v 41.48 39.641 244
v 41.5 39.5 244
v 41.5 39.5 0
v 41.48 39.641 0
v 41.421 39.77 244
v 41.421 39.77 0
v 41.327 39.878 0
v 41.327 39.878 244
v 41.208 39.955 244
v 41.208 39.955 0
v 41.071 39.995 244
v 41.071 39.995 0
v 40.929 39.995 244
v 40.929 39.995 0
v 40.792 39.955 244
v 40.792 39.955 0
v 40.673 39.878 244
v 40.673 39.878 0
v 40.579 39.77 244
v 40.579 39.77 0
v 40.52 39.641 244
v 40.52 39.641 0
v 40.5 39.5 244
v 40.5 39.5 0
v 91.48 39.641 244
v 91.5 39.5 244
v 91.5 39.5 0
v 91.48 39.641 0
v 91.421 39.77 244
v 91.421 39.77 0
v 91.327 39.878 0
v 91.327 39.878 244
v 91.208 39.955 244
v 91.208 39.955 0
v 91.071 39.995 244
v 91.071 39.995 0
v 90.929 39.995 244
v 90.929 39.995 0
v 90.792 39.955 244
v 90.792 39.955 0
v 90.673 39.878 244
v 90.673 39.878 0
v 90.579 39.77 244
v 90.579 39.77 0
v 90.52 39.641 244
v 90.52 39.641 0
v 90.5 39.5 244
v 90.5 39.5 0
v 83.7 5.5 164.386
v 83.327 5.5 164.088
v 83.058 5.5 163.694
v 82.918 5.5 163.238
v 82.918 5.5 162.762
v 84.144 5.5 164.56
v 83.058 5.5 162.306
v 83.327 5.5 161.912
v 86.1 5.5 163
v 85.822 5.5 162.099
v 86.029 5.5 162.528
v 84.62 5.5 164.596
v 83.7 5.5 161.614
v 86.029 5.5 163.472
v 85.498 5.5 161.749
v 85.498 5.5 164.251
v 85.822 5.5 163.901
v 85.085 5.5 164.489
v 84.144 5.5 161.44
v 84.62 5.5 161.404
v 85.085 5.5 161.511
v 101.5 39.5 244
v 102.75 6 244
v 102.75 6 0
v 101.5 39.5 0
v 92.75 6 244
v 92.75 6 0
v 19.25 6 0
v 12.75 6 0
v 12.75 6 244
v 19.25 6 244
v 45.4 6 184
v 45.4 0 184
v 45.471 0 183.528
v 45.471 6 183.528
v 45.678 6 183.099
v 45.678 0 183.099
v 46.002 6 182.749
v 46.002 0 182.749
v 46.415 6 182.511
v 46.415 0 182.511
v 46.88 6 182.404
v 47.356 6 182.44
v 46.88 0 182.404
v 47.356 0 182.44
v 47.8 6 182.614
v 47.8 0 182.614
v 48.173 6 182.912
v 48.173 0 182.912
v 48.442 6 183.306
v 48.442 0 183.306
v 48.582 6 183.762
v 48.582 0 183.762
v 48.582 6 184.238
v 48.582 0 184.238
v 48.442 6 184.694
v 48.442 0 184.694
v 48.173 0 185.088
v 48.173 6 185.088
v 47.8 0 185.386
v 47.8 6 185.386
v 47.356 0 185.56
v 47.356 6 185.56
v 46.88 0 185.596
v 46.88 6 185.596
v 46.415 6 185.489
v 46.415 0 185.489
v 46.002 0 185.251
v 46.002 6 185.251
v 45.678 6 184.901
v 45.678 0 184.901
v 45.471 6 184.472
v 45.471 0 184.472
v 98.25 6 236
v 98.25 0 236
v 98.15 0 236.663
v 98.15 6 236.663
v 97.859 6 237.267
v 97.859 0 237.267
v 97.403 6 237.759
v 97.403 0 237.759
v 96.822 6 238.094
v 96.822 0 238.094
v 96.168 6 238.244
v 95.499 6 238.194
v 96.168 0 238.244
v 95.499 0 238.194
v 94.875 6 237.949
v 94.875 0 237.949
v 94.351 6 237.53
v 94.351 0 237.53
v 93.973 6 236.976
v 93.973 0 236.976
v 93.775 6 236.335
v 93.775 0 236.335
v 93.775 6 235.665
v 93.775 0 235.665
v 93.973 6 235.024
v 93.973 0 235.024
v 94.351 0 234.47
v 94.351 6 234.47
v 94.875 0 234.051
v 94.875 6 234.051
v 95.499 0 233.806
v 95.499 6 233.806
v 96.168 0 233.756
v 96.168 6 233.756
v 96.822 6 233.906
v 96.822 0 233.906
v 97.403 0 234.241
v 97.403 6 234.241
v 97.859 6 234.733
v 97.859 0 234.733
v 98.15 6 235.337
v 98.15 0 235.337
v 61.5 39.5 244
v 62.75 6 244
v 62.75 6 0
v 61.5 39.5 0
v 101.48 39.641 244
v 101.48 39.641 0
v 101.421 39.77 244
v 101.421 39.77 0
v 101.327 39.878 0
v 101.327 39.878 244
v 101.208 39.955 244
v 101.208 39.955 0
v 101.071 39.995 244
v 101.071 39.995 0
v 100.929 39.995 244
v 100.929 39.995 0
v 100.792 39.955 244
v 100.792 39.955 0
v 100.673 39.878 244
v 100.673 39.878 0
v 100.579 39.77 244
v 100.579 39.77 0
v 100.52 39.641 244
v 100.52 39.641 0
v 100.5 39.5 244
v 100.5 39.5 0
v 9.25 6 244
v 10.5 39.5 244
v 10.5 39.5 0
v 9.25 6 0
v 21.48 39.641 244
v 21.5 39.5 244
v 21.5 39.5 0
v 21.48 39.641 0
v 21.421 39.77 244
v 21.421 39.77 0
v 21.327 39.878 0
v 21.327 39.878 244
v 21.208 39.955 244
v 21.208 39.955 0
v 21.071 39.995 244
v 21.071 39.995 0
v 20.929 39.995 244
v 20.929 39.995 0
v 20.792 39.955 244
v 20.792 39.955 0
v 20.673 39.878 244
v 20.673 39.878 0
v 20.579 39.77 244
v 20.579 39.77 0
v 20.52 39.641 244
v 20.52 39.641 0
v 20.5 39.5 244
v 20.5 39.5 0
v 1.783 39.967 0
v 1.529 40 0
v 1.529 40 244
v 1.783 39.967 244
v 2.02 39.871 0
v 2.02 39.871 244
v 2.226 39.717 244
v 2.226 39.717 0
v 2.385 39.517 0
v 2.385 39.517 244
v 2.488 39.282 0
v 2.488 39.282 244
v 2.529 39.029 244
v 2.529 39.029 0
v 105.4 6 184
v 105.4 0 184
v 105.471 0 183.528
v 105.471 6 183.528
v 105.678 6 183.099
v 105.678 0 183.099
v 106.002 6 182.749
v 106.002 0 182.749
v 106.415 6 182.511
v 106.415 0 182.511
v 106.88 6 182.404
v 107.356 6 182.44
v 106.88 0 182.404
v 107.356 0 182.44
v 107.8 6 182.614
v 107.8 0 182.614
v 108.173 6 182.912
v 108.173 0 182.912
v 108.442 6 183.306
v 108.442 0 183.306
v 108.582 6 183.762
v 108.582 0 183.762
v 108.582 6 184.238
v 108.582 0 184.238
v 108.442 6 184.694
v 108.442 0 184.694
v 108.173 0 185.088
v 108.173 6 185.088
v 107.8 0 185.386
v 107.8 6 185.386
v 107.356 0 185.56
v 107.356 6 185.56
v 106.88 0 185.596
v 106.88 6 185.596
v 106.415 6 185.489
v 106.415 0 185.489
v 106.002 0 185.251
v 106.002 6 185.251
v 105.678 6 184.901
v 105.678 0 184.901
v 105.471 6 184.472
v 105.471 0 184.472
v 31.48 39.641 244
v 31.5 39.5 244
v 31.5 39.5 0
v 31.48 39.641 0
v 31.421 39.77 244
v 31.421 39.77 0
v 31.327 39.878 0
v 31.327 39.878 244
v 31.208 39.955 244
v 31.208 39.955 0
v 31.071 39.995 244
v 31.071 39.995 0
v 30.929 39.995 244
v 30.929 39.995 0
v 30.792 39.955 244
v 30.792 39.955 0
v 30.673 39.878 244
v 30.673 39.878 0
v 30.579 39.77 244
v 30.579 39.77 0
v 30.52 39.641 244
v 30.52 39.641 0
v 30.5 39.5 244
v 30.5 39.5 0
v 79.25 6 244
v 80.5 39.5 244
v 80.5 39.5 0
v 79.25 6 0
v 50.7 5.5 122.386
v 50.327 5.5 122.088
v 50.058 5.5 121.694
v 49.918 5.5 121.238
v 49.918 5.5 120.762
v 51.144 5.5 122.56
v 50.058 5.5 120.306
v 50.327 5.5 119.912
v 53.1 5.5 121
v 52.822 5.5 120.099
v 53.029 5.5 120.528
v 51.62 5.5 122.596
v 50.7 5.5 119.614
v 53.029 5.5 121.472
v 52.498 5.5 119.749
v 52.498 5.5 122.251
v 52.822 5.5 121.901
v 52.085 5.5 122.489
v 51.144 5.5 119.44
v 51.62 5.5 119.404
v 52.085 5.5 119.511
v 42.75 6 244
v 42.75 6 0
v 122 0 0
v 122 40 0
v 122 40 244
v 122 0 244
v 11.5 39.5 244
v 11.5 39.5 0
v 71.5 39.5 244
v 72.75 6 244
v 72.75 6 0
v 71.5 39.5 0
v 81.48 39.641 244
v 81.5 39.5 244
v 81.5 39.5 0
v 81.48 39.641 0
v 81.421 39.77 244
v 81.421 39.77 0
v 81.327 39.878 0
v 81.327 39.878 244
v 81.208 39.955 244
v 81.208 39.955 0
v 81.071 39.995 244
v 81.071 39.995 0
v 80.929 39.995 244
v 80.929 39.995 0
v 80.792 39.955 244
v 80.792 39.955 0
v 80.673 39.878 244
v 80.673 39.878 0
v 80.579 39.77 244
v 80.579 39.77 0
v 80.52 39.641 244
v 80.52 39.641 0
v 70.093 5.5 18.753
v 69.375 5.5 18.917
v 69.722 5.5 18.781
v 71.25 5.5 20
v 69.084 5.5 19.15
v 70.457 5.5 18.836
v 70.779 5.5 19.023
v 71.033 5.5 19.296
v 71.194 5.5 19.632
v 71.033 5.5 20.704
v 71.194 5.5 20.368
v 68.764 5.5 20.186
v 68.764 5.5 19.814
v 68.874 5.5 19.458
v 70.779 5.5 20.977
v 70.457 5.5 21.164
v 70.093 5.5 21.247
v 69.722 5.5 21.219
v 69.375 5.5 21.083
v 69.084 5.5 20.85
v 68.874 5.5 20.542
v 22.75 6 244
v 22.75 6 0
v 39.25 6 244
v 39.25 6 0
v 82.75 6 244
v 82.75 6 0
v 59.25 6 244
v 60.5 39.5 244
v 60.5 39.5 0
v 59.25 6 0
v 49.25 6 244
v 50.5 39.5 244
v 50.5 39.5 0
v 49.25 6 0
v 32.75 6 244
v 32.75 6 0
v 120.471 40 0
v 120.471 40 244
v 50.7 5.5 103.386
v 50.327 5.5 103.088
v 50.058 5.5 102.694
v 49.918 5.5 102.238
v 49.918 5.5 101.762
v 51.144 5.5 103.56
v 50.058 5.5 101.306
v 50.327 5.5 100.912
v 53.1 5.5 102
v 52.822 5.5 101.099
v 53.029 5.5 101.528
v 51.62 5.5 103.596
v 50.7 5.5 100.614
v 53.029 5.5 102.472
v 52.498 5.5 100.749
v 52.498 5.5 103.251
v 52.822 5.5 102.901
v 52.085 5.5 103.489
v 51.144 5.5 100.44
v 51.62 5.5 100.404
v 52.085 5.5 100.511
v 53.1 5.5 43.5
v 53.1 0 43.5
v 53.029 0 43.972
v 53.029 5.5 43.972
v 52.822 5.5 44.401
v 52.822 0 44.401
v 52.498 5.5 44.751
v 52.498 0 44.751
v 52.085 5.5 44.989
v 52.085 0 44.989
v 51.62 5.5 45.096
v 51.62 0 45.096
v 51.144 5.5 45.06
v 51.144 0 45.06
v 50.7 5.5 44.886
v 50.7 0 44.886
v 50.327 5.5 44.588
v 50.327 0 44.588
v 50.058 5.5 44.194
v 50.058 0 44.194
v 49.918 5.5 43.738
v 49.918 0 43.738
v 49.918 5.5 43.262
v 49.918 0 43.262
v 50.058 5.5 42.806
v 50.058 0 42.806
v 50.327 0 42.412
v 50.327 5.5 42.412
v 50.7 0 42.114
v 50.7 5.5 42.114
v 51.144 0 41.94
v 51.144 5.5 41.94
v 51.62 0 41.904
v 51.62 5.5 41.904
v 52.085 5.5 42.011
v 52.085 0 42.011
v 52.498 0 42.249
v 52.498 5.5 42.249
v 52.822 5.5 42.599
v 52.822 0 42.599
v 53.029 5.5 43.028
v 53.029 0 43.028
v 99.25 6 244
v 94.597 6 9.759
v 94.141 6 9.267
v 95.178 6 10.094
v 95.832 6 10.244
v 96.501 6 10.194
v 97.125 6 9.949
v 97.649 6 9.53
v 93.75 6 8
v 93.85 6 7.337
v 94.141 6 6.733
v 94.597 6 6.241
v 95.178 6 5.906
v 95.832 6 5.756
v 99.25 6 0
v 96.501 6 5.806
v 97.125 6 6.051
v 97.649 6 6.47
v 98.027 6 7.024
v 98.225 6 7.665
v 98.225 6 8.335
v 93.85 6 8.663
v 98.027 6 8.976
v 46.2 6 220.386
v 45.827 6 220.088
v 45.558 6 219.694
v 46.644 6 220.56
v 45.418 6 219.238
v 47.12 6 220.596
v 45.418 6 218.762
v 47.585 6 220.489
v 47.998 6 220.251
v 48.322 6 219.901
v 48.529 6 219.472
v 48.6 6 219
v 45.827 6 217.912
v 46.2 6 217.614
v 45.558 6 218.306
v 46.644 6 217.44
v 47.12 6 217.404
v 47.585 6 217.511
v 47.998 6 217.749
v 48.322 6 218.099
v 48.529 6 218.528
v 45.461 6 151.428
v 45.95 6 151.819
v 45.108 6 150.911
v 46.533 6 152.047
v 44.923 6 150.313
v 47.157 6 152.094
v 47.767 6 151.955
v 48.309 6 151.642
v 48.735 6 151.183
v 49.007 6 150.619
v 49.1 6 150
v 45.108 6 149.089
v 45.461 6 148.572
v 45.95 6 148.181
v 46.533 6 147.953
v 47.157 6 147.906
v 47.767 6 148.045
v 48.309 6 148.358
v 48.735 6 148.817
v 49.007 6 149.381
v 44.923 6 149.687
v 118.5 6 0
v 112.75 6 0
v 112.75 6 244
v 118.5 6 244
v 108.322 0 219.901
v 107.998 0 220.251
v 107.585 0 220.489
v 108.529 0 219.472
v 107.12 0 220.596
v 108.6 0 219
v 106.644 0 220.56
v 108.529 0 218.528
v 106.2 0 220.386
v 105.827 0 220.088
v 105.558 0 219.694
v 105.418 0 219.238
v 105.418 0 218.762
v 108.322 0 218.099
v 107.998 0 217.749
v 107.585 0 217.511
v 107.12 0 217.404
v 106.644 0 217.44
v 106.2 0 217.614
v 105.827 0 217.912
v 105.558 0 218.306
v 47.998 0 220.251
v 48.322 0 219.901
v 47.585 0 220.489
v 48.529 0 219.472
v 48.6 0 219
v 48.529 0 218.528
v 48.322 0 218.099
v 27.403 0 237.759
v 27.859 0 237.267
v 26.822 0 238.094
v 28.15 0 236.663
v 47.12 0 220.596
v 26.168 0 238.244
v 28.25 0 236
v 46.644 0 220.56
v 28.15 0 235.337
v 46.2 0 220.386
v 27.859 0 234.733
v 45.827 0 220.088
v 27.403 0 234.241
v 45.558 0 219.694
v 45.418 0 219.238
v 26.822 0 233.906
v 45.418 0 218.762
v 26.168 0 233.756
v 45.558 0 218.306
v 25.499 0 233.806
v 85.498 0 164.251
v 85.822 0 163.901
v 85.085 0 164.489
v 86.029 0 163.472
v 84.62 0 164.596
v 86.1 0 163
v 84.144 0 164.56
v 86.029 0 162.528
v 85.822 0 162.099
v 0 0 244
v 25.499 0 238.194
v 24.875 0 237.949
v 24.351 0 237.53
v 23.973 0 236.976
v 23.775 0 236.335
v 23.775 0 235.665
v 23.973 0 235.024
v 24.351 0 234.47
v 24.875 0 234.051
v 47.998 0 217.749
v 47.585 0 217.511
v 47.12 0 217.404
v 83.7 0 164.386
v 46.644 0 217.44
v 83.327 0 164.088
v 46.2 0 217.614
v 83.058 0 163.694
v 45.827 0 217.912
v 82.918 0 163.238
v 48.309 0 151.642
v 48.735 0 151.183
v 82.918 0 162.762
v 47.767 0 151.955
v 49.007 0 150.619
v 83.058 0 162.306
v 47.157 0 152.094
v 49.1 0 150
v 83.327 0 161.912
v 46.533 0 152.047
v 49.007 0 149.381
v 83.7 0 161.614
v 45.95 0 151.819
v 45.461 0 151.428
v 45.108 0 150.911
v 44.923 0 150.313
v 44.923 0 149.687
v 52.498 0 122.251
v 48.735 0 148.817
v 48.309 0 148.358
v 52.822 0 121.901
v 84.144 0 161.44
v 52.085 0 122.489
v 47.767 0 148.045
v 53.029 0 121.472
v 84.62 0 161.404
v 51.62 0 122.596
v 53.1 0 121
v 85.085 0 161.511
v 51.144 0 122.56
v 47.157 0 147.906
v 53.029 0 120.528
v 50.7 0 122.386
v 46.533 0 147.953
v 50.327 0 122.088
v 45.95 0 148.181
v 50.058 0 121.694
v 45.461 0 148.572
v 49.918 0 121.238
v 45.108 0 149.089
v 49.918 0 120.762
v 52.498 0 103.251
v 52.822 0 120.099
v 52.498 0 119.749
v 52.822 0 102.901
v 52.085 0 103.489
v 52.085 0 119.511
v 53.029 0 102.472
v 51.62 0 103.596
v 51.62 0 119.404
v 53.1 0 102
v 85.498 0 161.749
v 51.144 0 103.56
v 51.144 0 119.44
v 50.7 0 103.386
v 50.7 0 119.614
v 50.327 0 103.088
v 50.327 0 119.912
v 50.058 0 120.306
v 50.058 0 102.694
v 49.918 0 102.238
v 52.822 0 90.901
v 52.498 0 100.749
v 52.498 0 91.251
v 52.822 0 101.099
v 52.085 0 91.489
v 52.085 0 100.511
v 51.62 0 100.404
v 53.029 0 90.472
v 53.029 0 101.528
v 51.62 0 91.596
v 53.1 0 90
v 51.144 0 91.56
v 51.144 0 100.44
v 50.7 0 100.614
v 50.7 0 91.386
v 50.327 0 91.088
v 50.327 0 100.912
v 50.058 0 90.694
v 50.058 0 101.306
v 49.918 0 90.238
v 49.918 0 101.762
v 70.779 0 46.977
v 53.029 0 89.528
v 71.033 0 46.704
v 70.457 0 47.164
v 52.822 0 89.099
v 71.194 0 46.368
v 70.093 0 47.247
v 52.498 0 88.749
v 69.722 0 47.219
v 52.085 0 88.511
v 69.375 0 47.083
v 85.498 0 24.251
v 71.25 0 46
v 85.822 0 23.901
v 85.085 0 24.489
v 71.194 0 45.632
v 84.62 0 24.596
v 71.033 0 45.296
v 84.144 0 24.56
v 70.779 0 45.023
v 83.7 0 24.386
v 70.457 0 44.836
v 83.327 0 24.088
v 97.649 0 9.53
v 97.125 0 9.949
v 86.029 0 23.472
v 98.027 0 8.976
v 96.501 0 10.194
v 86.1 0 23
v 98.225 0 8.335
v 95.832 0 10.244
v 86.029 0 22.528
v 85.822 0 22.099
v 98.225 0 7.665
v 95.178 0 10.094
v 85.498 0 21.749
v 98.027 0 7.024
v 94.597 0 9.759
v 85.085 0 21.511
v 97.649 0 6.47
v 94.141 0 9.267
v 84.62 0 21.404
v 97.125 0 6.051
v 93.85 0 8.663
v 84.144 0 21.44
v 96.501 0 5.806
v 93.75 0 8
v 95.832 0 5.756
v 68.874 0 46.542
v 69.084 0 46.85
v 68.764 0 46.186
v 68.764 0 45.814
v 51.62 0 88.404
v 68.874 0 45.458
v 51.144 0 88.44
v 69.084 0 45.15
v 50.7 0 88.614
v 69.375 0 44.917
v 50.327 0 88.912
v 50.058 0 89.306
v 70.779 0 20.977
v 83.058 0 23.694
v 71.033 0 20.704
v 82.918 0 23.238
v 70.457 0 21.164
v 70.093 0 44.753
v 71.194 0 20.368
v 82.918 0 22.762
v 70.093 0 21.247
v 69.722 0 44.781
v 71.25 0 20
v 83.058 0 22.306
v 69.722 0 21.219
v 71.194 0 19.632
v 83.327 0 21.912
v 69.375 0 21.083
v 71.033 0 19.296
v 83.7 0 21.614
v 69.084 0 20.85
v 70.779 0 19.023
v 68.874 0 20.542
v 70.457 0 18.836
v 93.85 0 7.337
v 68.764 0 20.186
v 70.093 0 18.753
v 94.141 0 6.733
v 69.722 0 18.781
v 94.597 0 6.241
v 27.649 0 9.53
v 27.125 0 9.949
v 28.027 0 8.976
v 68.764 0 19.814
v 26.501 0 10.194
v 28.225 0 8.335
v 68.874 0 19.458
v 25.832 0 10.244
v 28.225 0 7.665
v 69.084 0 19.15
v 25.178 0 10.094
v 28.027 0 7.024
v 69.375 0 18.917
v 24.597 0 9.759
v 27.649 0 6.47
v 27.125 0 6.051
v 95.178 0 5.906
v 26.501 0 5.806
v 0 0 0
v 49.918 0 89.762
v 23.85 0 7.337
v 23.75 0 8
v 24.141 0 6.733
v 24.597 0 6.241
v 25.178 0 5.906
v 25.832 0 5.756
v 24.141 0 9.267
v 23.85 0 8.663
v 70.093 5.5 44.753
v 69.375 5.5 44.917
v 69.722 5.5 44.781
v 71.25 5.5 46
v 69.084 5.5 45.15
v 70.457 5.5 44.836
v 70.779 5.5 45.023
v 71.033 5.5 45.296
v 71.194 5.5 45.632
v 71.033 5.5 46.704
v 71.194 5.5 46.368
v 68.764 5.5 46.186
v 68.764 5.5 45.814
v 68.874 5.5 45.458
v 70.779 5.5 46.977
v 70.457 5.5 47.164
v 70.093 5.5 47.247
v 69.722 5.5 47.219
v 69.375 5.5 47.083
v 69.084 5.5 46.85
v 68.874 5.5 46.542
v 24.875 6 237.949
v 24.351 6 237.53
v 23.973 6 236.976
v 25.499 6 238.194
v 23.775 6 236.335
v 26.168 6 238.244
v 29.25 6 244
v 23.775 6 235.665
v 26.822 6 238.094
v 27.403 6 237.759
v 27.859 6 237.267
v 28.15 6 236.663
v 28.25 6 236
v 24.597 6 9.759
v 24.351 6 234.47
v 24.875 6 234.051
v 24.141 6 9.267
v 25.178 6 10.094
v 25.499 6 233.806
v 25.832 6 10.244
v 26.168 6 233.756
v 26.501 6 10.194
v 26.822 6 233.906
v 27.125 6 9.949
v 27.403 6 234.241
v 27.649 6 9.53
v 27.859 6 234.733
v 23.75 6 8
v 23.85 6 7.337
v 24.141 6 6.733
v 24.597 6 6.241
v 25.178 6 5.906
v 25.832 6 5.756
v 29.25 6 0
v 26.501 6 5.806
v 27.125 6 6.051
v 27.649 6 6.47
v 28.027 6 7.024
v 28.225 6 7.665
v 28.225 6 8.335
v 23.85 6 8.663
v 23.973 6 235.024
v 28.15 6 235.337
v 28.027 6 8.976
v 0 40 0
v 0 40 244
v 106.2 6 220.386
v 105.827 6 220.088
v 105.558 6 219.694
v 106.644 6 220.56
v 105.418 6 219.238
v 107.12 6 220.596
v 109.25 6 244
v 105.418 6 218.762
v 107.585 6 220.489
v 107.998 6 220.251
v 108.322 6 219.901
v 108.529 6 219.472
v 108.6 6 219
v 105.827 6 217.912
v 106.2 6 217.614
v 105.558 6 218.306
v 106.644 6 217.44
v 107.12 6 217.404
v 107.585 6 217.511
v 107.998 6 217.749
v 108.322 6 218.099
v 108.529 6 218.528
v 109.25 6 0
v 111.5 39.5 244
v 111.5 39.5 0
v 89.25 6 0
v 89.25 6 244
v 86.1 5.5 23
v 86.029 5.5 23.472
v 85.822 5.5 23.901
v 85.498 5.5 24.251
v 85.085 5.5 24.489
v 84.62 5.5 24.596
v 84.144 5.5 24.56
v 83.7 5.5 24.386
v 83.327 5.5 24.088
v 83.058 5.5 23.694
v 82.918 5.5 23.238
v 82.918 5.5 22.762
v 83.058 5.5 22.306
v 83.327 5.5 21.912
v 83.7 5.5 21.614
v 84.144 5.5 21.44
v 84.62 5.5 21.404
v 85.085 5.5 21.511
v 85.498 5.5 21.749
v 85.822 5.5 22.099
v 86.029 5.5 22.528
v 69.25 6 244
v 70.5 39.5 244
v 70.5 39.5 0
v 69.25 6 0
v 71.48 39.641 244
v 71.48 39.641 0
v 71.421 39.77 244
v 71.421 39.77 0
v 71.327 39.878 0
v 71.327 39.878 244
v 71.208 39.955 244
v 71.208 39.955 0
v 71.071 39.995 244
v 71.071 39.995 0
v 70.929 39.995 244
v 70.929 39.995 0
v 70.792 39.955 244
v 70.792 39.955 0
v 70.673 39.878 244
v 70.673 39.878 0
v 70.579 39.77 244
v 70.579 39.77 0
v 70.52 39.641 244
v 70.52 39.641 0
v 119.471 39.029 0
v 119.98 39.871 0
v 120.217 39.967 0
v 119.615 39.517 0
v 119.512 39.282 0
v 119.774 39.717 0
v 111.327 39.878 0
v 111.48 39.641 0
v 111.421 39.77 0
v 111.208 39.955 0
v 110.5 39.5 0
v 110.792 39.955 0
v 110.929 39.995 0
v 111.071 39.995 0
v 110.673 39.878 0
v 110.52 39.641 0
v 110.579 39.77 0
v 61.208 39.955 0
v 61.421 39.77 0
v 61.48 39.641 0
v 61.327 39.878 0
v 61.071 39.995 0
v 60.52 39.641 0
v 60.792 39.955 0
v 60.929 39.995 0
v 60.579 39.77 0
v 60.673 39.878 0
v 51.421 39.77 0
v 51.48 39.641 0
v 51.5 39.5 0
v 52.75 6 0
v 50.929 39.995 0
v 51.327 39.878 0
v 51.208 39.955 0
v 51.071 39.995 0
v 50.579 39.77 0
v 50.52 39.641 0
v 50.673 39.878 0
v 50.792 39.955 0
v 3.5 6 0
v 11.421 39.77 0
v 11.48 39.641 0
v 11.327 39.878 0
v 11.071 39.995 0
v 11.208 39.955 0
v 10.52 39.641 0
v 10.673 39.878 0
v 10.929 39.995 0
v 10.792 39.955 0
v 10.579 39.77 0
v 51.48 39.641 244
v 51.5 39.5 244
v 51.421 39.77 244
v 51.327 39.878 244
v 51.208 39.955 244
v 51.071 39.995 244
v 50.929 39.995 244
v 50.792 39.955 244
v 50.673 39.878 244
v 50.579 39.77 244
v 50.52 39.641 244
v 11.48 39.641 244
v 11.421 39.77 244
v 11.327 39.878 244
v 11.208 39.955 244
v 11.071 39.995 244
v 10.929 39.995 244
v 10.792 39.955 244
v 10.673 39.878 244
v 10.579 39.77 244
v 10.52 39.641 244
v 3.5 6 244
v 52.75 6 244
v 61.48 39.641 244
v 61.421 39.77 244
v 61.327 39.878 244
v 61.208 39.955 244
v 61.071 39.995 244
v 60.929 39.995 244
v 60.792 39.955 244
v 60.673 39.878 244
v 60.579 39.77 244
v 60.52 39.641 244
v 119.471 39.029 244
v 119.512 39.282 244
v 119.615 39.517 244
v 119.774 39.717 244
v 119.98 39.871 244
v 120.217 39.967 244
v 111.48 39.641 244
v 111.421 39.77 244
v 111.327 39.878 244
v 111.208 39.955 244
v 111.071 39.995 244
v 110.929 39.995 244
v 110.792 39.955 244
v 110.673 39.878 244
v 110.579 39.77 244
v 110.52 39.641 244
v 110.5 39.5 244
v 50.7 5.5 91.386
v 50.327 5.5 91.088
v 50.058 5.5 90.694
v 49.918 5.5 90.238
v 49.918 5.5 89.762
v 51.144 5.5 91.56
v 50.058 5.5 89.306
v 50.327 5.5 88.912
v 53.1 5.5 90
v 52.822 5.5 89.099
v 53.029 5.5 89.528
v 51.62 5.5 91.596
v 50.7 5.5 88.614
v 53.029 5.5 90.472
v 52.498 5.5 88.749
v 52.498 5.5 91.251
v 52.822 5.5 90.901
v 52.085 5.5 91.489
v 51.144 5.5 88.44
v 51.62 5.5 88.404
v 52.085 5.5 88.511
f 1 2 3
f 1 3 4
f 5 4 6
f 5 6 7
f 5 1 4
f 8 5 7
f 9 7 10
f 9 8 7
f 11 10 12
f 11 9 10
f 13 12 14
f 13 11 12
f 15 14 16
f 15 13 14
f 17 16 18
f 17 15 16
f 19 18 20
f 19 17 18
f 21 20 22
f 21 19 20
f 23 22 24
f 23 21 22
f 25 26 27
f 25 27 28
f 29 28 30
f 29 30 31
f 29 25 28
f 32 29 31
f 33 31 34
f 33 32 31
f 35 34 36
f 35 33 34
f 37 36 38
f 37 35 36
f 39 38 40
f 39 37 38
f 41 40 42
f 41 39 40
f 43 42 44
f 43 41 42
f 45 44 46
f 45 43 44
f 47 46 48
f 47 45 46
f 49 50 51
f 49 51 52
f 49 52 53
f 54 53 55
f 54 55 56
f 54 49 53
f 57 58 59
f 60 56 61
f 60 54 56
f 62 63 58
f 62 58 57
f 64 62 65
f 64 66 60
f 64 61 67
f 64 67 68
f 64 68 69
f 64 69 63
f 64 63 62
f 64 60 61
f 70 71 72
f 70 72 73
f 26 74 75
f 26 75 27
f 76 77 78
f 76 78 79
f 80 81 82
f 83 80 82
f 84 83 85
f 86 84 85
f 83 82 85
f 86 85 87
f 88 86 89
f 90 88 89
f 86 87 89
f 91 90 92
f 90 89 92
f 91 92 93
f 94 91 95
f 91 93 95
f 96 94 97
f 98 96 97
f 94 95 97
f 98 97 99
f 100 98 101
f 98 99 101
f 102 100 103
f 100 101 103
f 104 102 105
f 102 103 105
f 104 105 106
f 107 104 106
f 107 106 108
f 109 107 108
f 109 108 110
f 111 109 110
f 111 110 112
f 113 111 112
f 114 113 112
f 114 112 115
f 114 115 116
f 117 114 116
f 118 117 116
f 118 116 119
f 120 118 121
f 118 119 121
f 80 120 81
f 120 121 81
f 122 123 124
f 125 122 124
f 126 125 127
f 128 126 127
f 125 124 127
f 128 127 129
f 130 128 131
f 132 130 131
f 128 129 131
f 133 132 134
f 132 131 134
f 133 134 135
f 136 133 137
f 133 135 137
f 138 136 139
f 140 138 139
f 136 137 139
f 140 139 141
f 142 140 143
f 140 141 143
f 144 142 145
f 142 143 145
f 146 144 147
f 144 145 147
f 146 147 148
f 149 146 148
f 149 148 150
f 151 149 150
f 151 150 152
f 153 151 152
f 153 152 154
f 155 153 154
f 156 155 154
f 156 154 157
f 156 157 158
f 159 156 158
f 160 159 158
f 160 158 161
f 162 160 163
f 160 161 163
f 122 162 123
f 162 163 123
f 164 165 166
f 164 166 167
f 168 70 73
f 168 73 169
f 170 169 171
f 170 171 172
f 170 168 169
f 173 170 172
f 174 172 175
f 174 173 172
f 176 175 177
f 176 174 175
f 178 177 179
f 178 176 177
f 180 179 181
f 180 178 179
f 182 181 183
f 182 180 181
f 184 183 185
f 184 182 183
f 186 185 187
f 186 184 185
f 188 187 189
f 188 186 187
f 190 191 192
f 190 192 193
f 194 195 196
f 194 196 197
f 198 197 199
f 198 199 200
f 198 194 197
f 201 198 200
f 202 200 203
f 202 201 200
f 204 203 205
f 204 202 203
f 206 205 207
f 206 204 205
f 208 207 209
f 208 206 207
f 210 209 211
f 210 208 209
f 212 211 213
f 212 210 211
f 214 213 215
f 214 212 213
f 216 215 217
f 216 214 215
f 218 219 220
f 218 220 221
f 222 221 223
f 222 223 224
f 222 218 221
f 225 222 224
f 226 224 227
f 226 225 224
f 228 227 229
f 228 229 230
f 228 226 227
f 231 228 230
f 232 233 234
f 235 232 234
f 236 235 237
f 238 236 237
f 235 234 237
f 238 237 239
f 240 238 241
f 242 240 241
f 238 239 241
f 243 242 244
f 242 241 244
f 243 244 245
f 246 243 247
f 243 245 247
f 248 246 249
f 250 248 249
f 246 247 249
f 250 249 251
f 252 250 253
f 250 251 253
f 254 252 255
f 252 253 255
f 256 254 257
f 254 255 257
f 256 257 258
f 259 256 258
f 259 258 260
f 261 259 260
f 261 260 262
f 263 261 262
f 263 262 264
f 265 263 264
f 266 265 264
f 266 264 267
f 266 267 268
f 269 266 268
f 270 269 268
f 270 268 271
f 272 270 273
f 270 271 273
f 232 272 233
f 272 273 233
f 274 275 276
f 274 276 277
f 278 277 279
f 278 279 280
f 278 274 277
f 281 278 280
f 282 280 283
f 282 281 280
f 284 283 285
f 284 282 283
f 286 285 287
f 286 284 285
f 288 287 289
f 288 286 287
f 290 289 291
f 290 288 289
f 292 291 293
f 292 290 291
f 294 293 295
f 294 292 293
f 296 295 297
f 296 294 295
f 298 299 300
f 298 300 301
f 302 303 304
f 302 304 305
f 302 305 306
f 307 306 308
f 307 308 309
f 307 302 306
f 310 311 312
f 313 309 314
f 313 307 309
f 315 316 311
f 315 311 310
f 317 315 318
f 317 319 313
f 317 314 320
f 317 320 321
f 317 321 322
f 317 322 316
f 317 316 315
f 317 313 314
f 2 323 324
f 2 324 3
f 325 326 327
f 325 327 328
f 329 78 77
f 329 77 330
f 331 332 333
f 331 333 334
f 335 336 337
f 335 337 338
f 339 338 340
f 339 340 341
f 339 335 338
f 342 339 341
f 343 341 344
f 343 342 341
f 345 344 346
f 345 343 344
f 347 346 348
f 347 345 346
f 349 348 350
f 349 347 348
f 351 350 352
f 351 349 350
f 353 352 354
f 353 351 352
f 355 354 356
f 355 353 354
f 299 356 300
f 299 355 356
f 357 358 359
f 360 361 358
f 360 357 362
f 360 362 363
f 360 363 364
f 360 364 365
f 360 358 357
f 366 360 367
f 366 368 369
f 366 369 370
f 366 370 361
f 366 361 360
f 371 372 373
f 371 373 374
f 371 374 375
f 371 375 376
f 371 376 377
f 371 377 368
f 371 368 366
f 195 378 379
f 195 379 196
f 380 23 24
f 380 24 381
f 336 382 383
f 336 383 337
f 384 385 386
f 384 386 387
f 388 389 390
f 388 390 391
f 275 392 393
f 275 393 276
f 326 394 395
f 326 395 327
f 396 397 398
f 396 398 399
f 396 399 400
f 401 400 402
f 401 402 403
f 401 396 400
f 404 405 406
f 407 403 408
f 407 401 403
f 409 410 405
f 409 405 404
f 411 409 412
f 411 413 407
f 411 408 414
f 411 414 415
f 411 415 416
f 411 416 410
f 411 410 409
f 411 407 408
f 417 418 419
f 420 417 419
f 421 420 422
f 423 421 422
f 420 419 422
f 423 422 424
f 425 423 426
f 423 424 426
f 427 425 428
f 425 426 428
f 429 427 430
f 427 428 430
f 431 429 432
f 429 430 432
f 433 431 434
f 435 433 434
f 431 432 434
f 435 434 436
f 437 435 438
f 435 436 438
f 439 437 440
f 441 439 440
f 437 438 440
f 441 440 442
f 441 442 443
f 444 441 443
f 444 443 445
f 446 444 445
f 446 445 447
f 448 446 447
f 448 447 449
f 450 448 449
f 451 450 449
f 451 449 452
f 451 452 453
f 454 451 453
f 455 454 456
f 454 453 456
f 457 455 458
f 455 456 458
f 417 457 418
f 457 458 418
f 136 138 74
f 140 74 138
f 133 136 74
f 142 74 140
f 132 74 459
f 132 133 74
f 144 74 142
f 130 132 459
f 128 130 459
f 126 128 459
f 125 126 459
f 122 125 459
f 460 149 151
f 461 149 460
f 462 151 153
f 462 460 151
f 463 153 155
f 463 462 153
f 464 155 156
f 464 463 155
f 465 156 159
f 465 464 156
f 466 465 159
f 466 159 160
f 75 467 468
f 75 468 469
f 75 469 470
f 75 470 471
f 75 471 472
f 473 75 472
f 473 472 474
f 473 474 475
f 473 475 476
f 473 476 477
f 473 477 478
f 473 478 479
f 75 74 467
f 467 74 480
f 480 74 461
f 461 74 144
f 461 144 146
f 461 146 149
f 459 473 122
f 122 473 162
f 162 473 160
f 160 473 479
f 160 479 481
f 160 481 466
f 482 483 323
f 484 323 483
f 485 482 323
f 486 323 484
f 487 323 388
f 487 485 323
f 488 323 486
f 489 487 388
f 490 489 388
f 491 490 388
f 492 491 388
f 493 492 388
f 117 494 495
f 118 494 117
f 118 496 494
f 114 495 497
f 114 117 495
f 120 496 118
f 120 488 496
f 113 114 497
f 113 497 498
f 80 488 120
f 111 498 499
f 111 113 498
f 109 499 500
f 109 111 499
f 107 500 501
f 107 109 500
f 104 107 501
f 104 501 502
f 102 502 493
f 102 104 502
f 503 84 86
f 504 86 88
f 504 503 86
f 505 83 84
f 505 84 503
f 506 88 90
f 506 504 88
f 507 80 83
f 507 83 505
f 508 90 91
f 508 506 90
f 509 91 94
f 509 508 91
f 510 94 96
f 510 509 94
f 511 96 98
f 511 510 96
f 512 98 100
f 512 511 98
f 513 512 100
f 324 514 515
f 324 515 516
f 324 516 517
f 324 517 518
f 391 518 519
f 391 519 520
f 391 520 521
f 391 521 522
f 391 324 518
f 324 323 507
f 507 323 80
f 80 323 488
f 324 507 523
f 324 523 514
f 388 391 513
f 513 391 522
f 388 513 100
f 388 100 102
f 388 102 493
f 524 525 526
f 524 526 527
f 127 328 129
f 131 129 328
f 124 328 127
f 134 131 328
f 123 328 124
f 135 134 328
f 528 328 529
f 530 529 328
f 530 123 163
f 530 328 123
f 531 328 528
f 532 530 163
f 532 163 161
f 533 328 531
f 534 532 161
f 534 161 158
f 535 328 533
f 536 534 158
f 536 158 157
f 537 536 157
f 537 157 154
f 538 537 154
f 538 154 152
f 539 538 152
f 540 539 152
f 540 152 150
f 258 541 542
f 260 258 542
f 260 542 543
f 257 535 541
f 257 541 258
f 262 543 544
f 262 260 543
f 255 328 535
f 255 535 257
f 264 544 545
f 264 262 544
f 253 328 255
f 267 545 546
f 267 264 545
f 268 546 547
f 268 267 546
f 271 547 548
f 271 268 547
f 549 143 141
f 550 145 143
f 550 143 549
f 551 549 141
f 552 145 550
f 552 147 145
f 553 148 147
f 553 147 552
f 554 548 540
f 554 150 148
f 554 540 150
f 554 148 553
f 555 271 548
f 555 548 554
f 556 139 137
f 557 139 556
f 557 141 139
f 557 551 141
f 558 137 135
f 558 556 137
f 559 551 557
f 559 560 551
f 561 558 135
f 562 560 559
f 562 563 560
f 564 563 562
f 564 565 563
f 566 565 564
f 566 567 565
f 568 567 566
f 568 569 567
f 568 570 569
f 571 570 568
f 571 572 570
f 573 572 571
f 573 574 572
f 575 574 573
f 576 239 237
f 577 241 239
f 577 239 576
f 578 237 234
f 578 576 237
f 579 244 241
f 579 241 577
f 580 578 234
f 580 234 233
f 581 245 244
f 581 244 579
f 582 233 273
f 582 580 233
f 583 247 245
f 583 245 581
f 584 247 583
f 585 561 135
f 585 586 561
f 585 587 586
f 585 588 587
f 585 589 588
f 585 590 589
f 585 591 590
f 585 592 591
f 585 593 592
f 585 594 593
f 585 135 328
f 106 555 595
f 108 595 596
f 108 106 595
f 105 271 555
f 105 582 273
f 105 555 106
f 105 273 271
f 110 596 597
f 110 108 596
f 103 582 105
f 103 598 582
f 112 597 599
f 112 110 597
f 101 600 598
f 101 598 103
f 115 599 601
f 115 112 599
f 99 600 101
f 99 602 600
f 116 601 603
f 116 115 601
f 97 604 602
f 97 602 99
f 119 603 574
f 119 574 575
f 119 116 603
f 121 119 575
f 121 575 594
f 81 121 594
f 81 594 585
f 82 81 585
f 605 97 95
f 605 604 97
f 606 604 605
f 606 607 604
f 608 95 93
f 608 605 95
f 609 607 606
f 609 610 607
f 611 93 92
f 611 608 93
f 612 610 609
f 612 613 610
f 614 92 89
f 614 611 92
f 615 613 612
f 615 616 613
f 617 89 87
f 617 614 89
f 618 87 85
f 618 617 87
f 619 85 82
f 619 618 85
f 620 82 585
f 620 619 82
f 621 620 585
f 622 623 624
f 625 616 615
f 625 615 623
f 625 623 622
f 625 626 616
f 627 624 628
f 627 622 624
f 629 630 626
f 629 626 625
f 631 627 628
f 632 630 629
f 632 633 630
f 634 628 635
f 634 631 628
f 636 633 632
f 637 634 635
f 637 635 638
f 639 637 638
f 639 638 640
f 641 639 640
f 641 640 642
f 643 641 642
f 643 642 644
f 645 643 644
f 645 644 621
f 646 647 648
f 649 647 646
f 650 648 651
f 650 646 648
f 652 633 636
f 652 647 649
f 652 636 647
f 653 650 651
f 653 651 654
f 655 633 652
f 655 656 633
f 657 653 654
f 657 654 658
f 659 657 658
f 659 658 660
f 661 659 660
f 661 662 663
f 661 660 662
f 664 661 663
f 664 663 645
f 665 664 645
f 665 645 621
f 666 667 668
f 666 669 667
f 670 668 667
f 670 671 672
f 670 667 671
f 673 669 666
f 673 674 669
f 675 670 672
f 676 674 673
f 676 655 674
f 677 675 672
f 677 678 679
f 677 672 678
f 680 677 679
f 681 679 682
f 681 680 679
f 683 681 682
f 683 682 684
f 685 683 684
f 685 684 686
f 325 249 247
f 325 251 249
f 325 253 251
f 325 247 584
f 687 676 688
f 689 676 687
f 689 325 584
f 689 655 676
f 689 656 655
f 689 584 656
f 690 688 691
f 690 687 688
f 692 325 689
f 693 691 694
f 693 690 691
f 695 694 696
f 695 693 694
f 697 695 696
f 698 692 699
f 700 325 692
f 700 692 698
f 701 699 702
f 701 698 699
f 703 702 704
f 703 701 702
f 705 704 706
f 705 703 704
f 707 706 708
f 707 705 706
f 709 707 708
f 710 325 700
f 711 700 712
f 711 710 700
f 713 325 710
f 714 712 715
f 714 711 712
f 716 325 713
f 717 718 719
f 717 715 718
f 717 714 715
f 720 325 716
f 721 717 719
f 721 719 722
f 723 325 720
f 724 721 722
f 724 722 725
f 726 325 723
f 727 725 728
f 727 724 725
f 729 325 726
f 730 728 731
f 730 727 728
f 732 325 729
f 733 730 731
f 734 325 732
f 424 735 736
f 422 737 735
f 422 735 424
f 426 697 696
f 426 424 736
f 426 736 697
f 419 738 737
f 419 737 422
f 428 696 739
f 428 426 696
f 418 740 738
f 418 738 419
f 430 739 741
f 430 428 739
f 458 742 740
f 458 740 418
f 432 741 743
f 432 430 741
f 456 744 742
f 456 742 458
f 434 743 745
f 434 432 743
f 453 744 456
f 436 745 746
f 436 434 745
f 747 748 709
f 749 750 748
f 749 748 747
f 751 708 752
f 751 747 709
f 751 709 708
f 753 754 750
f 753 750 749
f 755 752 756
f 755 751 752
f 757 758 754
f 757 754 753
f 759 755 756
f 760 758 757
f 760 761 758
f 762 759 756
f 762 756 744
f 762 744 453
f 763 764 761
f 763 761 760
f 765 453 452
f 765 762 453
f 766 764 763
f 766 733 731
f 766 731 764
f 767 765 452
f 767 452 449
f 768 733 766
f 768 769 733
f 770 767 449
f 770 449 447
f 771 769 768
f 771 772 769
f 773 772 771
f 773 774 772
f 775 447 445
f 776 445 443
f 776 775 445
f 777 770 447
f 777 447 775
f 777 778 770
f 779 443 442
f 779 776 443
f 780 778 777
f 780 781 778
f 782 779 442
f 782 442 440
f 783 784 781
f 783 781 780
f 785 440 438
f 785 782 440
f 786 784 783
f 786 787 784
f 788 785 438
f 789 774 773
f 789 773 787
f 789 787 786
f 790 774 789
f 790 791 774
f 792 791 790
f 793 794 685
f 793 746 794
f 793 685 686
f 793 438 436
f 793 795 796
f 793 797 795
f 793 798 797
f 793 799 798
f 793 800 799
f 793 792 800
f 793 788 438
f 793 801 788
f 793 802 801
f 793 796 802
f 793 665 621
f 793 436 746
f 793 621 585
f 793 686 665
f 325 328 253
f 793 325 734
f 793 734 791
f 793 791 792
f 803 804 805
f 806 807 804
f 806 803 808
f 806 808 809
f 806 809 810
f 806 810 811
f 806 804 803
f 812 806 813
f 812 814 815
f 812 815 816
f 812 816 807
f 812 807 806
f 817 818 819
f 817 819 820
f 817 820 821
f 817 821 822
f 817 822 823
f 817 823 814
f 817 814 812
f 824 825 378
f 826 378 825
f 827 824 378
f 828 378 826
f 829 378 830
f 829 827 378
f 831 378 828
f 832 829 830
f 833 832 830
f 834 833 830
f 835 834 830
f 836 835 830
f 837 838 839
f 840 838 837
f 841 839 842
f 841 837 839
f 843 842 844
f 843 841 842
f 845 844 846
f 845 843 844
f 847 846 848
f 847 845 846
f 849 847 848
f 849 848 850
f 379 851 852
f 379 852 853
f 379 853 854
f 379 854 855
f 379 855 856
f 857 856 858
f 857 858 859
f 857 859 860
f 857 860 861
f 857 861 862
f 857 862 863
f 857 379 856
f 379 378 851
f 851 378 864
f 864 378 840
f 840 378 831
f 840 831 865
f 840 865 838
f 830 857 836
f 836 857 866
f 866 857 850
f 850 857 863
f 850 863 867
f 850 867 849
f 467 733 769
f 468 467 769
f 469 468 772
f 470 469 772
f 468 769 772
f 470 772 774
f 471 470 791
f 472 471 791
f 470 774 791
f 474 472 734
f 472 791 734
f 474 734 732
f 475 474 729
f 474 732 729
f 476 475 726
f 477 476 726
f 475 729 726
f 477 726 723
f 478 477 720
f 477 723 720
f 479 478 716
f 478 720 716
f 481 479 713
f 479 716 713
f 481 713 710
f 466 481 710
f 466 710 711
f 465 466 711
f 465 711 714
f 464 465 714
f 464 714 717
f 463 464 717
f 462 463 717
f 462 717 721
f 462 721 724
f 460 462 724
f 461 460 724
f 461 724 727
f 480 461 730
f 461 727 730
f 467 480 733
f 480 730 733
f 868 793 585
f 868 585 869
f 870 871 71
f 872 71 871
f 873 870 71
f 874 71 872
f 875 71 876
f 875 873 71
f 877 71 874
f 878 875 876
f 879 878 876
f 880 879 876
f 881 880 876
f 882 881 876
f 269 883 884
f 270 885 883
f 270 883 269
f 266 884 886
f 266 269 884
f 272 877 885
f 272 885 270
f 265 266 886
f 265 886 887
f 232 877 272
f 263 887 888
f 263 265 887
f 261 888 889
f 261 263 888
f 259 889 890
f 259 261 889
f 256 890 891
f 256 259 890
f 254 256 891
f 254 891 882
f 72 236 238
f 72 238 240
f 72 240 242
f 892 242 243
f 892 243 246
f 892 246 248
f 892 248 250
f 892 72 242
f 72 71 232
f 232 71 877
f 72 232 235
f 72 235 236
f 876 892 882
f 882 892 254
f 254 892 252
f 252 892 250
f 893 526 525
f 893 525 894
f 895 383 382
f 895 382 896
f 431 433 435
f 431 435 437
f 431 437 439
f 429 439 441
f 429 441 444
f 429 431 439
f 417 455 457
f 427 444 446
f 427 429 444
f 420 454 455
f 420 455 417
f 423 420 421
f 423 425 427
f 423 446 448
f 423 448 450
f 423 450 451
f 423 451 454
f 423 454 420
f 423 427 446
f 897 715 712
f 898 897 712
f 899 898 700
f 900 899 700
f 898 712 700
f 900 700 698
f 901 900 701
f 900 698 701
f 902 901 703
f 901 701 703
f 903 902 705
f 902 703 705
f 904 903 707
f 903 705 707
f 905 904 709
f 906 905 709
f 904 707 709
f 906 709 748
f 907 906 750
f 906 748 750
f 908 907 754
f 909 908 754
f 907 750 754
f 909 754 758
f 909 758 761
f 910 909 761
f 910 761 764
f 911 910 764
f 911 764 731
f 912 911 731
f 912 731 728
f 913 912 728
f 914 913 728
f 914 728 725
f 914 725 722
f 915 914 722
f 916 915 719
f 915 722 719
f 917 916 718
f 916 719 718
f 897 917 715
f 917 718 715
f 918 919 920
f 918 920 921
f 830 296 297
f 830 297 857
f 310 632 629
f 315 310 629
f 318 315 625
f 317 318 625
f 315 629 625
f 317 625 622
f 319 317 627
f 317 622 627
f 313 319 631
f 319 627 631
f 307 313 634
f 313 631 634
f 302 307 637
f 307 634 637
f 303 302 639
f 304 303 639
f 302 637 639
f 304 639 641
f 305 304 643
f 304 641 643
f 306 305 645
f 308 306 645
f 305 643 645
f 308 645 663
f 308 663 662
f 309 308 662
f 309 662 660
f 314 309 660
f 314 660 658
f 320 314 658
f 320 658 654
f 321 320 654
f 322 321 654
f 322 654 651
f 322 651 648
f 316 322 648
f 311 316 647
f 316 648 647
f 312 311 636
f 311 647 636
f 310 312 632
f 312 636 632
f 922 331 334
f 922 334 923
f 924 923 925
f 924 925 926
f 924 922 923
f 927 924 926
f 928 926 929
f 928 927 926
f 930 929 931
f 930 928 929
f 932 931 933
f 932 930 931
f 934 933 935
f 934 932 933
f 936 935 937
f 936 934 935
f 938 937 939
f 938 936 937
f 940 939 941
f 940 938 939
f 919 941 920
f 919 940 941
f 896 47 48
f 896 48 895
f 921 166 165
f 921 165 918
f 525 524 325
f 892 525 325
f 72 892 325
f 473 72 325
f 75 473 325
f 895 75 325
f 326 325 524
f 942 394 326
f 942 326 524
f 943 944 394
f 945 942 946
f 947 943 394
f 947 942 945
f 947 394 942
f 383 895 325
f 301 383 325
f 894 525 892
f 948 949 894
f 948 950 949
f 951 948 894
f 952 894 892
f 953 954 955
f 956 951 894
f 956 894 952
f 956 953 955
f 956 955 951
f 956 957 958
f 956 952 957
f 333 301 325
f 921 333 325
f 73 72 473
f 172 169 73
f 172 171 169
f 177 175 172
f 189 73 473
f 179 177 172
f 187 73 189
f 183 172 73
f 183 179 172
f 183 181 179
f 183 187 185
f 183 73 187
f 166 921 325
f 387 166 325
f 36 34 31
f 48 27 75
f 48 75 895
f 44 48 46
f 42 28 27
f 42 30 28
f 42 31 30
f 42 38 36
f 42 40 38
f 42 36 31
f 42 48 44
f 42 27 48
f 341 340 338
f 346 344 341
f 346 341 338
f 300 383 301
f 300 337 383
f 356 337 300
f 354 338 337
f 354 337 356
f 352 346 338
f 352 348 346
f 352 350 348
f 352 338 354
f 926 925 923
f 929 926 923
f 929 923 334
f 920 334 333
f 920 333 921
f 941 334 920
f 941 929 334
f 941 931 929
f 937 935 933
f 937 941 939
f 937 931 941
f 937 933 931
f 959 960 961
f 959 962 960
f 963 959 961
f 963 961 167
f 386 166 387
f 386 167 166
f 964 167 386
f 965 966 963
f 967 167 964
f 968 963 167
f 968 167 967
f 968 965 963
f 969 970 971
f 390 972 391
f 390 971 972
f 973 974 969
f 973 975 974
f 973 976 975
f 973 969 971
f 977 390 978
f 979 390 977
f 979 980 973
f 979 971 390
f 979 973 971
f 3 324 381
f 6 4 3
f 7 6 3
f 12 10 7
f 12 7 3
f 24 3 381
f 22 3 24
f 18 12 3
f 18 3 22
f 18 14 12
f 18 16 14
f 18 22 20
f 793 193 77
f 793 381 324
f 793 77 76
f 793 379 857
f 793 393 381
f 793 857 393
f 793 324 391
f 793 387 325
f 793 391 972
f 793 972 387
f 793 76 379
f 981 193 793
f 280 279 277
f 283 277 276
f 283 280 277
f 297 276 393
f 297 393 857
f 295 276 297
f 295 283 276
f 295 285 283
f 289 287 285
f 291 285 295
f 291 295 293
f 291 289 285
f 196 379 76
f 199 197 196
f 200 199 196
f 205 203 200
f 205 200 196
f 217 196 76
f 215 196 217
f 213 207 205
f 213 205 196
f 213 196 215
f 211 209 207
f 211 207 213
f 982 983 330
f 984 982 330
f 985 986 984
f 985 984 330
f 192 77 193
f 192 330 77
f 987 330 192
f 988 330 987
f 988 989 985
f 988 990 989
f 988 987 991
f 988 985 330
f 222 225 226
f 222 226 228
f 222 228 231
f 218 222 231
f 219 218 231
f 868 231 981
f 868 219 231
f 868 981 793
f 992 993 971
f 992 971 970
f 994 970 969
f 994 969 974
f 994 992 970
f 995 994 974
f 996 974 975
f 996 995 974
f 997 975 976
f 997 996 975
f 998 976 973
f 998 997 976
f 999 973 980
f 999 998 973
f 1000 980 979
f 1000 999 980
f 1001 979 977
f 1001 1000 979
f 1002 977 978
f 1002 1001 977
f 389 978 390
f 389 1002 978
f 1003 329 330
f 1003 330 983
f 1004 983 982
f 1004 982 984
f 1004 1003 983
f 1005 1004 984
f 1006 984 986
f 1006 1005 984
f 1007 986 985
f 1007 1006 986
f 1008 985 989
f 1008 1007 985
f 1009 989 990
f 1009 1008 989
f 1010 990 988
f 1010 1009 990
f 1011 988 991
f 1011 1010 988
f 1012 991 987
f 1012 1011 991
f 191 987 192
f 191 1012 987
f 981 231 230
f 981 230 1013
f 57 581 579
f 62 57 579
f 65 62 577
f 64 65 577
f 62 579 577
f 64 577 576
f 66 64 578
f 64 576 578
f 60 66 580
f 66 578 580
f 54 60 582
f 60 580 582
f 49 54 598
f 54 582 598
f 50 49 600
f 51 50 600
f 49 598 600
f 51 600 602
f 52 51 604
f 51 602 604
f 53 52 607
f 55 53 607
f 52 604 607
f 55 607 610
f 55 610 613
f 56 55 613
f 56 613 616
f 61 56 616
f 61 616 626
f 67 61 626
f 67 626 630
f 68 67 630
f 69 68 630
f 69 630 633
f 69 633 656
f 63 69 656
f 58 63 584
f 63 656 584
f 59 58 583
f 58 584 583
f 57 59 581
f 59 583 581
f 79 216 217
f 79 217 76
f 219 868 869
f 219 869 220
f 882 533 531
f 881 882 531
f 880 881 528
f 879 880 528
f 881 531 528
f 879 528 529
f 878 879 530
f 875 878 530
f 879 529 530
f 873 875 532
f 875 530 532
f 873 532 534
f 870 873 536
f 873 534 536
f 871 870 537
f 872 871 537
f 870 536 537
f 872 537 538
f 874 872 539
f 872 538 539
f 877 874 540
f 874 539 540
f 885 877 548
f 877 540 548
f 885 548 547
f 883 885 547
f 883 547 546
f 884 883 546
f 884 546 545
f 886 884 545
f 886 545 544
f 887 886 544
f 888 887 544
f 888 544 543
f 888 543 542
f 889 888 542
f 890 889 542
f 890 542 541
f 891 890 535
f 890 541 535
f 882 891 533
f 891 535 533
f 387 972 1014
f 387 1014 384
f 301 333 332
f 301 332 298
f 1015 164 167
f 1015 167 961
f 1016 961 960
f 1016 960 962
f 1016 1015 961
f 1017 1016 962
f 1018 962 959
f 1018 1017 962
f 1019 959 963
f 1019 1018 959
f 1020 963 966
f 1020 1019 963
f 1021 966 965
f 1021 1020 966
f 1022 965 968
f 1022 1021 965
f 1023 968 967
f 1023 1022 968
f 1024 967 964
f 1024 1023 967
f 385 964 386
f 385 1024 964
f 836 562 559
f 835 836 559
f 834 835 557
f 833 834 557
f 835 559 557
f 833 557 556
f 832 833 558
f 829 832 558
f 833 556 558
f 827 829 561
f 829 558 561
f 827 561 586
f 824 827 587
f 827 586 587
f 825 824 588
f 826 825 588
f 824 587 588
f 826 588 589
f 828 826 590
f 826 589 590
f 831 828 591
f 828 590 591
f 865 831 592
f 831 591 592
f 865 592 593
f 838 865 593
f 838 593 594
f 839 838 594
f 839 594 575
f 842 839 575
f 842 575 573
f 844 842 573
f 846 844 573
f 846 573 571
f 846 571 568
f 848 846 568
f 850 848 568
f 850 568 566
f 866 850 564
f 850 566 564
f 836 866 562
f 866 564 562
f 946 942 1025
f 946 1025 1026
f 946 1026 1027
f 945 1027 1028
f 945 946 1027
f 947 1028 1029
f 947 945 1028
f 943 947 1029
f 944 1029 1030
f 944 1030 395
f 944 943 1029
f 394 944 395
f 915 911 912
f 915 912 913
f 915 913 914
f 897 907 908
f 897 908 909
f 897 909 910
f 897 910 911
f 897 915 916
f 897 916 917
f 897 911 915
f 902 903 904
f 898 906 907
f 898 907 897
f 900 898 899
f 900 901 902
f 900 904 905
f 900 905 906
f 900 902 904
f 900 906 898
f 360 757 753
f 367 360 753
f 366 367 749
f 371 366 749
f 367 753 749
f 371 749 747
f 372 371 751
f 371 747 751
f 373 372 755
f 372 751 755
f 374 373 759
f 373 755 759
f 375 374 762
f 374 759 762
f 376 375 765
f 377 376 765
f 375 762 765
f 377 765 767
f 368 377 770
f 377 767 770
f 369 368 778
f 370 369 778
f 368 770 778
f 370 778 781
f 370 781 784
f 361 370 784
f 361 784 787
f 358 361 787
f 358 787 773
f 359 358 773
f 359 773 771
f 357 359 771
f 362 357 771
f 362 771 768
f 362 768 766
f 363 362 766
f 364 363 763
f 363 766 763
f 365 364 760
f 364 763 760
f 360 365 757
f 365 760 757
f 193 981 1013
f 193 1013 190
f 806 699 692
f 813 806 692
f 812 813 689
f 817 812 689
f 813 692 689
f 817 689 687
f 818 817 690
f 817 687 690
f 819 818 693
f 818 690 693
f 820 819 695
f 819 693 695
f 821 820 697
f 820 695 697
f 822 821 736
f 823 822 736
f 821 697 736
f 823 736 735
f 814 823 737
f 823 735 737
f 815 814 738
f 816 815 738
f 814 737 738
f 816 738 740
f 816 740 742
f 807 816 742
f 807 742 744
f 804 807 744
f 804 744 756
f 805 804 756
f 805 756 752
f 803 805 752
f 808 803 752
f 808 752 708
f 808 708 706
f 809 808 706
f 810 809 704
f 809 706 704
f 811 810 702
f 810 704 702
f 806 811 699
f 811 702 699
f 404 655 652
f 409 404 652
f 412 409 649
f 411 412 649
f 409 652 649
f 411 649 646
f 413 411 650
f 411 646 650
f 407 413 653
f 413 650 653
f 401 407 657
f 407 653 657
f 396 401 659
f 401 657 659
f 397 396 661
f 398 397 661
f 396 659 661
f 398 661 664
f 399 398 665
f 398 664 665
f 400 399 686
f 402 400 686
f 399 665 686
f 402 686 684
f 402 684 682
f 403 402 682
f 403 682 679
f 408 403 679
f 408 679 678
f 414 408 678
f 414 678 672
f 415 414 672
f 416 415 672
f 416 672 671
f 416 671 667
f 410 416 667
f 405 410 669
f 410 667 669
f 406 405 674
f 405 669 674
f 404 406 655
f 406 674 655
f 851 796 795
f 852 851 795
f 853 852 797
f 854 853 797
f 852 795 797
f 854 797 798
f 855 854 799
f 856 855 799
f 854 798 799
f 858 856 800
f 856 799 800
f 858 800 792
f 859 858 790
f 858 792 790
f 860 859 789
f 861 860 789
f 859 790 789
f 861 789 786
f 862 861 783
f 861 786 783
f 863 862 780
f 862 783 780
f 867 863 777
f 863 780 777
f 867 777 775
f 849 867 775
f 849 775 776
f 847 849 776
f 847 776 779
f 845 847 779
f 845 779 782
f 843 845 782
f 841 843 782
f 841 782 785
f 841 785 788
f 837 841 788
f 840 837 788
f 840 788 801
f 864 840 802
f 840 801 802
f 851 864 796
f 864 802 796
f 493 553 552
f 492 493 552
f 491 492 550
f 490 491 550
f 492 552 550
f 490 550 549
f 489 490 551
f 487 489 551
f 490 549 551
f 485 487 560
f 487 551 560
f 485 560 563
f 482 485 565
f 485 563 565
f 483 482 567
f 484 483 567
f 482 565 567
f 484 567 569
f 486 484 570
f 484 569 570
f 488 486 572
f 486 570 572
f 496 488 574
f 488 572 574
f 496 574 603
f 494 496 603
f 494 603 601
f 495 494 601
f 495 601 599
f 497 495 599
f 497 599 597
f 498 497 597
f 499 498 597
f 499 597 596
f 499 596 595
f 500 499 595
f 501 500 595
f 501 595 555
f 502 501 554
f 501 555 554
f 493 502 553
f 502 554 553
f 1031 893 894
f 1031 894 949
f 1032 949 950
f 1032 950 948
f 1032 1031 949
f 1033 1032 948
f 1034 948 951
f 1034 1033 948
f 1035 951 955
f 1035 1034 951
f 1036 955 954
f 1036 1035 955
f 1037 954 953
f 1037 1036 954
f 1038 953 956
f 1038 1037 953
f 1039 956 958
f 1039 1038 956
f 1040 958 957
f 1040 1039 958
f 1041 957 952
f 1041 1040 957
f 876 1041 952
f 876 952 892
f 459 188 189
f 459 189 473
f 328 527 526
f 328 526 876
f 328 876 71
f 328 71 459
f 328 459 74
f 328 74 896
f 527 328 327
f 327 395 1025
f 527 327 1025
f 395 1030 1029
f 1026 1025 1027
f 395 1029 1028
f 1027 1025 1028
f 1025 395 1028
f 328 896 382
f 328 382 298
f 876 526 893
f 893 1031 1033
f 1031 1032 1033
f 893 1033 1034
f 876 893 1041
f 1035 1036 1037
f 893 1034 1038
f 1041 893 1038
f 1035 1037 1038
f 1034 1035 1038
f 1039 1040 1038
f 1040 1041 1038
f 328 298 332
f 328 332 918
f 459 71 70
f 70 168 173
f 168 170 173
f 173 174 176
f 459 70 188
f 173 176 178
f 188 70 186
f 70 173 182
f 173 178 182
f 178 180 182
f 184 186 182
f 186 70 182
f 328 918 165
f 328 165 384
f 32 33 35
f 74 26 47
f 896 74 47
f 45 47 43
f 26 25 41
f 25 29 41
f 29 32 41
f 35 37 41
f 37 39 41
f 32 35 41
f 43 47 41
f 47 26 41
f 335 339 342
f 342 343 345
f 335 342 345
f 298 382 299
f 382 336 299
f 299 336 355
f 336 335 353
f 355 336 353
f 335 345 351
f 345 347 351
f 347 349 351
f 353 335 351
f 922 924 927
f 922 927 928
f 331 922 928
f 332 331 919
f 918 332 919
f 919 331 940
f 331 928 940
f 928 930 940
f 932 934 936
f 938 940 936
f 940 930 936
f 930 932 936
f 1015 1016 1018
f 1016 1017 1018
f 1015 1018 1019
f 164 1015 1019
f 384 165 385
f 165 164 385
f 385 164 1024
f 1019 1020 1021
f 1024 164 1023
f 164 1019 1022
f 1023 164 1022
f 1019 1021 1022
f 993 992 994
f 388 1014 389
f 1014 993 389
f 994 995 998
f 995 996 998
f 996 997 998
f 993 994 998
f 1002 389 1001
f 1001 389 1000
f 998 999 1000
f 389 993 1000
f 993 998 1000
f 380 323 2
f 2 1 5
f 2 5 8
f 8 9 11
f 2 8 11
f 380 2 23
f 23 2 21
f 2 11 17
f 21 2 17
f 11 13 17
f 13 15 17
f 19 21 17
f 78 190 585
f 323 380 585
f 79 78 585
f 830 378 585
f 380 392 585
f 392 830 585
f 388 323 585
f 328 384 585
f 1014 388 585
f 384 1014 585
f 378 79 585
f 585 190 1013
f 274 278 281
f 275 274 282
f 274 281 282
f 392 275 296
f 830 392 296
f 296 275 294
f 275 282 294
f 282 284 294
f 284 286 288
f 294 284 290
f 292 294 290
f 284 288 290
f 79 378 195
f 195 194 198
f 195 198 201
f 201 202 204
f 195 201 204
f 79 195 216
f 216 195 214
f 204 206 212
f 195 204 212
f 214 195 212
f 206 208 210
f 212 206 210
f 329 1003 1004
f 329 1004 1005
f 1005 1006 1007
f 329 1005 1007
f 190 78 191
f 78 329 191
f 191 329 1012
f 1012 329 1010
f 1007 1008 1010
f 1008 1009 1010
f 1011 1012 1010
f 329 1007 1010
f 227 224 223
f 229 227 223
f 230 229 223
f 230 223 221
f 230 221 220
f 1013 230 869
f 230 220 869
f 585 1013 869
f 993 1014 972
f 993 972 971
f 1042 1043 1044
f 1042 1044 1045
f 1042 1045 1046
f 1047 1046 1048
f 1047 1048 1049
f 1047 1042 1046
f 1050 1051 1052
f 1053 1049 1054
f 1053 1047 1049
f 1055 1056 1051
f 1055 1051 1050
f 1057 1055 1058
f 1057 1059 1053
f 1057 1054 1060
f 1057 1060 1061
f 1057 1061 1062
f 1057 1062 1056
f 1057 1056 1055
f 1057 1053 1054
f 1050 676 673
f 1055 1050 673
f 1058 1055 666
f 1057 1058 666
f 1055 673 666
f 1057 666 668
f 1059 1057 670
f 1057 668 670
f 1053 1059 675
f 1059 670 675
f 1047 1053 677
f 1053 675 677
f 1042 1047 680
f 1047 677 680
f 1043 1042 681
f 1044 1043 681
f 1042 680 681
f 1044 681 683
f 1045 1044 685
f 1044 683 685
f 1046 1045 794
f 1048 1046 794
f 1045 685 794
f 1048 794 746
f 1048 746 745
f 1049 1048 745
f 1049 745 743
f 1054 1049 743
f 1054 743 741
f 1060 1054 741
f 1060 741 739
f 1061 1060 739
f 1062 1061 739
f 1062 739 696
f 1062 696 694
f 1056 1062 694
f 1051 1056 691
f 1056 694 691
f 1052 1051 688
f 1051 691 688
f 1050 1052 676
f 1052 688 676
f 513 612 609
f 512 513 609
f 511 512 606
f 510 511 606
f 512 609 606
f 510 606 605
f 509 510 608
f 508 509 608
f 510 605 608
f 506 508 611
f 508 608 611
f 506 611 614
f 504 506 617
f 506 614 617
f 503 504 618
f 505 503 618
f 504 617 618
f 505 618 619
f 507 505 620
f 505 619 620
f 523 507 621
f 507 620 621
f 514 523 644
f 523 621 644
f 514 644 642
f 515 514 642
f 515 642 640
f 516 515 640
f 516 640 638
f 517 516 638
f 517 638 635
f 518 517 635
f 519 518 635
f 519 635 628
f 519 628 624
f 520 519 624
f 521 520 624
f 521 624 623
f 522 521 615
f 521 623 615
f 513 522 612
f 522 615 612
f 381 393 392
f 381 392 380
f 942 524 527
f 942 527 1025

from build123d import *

# Parameters (mm, degrees)
EXTRUDE_1_DEPTH       = 244
EXTRUDE_3_DEPTH       = 244
PATTERN_CURVE_1_COUNT = 11
PATTERN_CURVE_1_PITCH = 10
SKETCH_3_R            = 2.25
CUT_EXTRUDE_1_DEPTH   = 6
SKETCH_4_R            = 1.25
SKETCH_4_R_2          = 1.6
CUT_EXTRUDE_2_DEPTH   = 5.5
SKETCH_5_R            = 2.1
SKETCH_5_R_2          = 1.6
CUT_EXTRUDE_3_DEPTH   = 6


with BuildPart() as part:
    # Эскиз1 → Вытянуть1 (new body)
    with BuildSketch(Plane.XY):
        with BuildLine():
            Line((0, 40), (1.528979332, 40))
            ThreePointArc((1.528979332, 40), (2.225614441, 39.717425624), (2.528547087, 39.029399052))
            Line((2.528547087, 39.029399052), (3.5, 6))
            Line((3.5, 6), (118.5, 6))
            Line((118.5, 6), (119.471452913, 39.029399052))
            ThreePointArc((119.471452913, 39.029399052), (119.774385559, 39.717425624), (120.471020668, 40))
            Line((120.471020668, 40), (122, 40))
            Line((122, 40), (122, 0))
            Line((122, 0), (0, 0))
            Line((0, 0), (0, 40))
        make_face()
    extrude(amount=EXTRUDE_1_DEPTH)

    # Эскиз2 → Вытянуть3 (add)
    with BuildSketch(Plane.XY.offset(244)):
        with BuildLine():
            Line((10.5, 39.5), (9.25, 6))
            Line((9.25, 6), (12.75, 6))
            Line((12.75, 6), (11.5, 39.5))
            ThreePointArc((11.5, 39.5), (11, 40), (10.5, 39.5))
        make_face()
    extrude_3 = extrude(amount=-EXTRUDE_3_DEPTH)

    # Кривая1: Вытянуть3 ×11
    with Locations(*[(i * PATTERN_CURVE_1_PITCH, 0, 0) for i in range(1, PATTERN_CURVE_1_COUNT)]):
        add(extrude_3)

    # Эскиз3 → Вырез-Вытянуть1 (cut)
    with BuildSketch(Plane.XZ):
        with Locations((26, 236)):
            Circle(SKETCH_3_R)
        with Locations((96, 236)):
            Circle(SKETCH_3_R)
        with Locations(Location((96, 8, 0), (0, 0, 180))):
            Circle(SKETCH_3_R)
        with Locations(Location((26, 8, 0), (0, 0, 180))):
            Circle(SKETCH_3_R)
    extrude(amount=-CUT_EXTRUDE_1_DEPTH, mode=Mode.SUBTRACT)

    # Эскиз4 → Вырез-Вытянуть2 (cut)
    with BuildSketch(Plane(origin=(-5.723570629, 0, -26.359021189), x_dir=(1, 0, 0), z_dir=(0, -1, 0))):
        with Locations((75.723570629, 72.359021189)):
            Circle(SKETCH_4_R)
        with Locations((90.223570629, 189.359021189)):
            Circle(SKETCH_4_R_2)
        with Locations((90.223570629, 49.359021189)):
            Circle(SKETCH_4_R_2)
        with Locations((57.223570629, 147.359021189)):
            Circle(SKETCH_4_R_2)
        with Locations((57.223570629, 128.359021189)):
            Circle(SKETCH_4_R_2)
        with Locations((75.723570629, 46.359021189)):
            Circle(SKETCH_4_R)
        with Locations((57.223570629, 116.359021189)):
            Circle(SKETCH_4_R_2)
        with Locations((57.223570629, 69.859021189)):
            Circle(SKETCH_4_R_2)
    extrude(amount=-CUT_EXTRUDE_2_DEPTH, mode=Mode.SUBTRACT)

    # Эскиз5 → Вырез-Вытянуть3 (cut)
    with BuildSketch(Plane(origin=(128.324191418, 0, 423.775874855), x_dir=(-1, 0, 0), z_dir=(0, -1, 0))):
        with Locations(Location((81.324191418, 273.775874855, 0), (0, 0, 180))):
            Circle(SKETCH_5_R)
        with Locations((21.324191418, 239.775874855)):
            Circle(SKETCH_5_R_2)
        with Locations((81.324191418, 239.775874855)):
            Circle(SKETCH_5_R_2)
        with Locations(Location((81.324191418, 204.775874855, 0), (0, 0, 180))):
            Circle(SKETCH_5_R_2)
        with Locations(Location((21.324191418, 204.775874855, 0), (0, 0, 180))):
            Circle(SKETCH_5_R_2)
    extrude(amount=-CUT_EXTRUDE_3_DEPTH, mode=Mode.SUBTRACT)


solid = part.part
